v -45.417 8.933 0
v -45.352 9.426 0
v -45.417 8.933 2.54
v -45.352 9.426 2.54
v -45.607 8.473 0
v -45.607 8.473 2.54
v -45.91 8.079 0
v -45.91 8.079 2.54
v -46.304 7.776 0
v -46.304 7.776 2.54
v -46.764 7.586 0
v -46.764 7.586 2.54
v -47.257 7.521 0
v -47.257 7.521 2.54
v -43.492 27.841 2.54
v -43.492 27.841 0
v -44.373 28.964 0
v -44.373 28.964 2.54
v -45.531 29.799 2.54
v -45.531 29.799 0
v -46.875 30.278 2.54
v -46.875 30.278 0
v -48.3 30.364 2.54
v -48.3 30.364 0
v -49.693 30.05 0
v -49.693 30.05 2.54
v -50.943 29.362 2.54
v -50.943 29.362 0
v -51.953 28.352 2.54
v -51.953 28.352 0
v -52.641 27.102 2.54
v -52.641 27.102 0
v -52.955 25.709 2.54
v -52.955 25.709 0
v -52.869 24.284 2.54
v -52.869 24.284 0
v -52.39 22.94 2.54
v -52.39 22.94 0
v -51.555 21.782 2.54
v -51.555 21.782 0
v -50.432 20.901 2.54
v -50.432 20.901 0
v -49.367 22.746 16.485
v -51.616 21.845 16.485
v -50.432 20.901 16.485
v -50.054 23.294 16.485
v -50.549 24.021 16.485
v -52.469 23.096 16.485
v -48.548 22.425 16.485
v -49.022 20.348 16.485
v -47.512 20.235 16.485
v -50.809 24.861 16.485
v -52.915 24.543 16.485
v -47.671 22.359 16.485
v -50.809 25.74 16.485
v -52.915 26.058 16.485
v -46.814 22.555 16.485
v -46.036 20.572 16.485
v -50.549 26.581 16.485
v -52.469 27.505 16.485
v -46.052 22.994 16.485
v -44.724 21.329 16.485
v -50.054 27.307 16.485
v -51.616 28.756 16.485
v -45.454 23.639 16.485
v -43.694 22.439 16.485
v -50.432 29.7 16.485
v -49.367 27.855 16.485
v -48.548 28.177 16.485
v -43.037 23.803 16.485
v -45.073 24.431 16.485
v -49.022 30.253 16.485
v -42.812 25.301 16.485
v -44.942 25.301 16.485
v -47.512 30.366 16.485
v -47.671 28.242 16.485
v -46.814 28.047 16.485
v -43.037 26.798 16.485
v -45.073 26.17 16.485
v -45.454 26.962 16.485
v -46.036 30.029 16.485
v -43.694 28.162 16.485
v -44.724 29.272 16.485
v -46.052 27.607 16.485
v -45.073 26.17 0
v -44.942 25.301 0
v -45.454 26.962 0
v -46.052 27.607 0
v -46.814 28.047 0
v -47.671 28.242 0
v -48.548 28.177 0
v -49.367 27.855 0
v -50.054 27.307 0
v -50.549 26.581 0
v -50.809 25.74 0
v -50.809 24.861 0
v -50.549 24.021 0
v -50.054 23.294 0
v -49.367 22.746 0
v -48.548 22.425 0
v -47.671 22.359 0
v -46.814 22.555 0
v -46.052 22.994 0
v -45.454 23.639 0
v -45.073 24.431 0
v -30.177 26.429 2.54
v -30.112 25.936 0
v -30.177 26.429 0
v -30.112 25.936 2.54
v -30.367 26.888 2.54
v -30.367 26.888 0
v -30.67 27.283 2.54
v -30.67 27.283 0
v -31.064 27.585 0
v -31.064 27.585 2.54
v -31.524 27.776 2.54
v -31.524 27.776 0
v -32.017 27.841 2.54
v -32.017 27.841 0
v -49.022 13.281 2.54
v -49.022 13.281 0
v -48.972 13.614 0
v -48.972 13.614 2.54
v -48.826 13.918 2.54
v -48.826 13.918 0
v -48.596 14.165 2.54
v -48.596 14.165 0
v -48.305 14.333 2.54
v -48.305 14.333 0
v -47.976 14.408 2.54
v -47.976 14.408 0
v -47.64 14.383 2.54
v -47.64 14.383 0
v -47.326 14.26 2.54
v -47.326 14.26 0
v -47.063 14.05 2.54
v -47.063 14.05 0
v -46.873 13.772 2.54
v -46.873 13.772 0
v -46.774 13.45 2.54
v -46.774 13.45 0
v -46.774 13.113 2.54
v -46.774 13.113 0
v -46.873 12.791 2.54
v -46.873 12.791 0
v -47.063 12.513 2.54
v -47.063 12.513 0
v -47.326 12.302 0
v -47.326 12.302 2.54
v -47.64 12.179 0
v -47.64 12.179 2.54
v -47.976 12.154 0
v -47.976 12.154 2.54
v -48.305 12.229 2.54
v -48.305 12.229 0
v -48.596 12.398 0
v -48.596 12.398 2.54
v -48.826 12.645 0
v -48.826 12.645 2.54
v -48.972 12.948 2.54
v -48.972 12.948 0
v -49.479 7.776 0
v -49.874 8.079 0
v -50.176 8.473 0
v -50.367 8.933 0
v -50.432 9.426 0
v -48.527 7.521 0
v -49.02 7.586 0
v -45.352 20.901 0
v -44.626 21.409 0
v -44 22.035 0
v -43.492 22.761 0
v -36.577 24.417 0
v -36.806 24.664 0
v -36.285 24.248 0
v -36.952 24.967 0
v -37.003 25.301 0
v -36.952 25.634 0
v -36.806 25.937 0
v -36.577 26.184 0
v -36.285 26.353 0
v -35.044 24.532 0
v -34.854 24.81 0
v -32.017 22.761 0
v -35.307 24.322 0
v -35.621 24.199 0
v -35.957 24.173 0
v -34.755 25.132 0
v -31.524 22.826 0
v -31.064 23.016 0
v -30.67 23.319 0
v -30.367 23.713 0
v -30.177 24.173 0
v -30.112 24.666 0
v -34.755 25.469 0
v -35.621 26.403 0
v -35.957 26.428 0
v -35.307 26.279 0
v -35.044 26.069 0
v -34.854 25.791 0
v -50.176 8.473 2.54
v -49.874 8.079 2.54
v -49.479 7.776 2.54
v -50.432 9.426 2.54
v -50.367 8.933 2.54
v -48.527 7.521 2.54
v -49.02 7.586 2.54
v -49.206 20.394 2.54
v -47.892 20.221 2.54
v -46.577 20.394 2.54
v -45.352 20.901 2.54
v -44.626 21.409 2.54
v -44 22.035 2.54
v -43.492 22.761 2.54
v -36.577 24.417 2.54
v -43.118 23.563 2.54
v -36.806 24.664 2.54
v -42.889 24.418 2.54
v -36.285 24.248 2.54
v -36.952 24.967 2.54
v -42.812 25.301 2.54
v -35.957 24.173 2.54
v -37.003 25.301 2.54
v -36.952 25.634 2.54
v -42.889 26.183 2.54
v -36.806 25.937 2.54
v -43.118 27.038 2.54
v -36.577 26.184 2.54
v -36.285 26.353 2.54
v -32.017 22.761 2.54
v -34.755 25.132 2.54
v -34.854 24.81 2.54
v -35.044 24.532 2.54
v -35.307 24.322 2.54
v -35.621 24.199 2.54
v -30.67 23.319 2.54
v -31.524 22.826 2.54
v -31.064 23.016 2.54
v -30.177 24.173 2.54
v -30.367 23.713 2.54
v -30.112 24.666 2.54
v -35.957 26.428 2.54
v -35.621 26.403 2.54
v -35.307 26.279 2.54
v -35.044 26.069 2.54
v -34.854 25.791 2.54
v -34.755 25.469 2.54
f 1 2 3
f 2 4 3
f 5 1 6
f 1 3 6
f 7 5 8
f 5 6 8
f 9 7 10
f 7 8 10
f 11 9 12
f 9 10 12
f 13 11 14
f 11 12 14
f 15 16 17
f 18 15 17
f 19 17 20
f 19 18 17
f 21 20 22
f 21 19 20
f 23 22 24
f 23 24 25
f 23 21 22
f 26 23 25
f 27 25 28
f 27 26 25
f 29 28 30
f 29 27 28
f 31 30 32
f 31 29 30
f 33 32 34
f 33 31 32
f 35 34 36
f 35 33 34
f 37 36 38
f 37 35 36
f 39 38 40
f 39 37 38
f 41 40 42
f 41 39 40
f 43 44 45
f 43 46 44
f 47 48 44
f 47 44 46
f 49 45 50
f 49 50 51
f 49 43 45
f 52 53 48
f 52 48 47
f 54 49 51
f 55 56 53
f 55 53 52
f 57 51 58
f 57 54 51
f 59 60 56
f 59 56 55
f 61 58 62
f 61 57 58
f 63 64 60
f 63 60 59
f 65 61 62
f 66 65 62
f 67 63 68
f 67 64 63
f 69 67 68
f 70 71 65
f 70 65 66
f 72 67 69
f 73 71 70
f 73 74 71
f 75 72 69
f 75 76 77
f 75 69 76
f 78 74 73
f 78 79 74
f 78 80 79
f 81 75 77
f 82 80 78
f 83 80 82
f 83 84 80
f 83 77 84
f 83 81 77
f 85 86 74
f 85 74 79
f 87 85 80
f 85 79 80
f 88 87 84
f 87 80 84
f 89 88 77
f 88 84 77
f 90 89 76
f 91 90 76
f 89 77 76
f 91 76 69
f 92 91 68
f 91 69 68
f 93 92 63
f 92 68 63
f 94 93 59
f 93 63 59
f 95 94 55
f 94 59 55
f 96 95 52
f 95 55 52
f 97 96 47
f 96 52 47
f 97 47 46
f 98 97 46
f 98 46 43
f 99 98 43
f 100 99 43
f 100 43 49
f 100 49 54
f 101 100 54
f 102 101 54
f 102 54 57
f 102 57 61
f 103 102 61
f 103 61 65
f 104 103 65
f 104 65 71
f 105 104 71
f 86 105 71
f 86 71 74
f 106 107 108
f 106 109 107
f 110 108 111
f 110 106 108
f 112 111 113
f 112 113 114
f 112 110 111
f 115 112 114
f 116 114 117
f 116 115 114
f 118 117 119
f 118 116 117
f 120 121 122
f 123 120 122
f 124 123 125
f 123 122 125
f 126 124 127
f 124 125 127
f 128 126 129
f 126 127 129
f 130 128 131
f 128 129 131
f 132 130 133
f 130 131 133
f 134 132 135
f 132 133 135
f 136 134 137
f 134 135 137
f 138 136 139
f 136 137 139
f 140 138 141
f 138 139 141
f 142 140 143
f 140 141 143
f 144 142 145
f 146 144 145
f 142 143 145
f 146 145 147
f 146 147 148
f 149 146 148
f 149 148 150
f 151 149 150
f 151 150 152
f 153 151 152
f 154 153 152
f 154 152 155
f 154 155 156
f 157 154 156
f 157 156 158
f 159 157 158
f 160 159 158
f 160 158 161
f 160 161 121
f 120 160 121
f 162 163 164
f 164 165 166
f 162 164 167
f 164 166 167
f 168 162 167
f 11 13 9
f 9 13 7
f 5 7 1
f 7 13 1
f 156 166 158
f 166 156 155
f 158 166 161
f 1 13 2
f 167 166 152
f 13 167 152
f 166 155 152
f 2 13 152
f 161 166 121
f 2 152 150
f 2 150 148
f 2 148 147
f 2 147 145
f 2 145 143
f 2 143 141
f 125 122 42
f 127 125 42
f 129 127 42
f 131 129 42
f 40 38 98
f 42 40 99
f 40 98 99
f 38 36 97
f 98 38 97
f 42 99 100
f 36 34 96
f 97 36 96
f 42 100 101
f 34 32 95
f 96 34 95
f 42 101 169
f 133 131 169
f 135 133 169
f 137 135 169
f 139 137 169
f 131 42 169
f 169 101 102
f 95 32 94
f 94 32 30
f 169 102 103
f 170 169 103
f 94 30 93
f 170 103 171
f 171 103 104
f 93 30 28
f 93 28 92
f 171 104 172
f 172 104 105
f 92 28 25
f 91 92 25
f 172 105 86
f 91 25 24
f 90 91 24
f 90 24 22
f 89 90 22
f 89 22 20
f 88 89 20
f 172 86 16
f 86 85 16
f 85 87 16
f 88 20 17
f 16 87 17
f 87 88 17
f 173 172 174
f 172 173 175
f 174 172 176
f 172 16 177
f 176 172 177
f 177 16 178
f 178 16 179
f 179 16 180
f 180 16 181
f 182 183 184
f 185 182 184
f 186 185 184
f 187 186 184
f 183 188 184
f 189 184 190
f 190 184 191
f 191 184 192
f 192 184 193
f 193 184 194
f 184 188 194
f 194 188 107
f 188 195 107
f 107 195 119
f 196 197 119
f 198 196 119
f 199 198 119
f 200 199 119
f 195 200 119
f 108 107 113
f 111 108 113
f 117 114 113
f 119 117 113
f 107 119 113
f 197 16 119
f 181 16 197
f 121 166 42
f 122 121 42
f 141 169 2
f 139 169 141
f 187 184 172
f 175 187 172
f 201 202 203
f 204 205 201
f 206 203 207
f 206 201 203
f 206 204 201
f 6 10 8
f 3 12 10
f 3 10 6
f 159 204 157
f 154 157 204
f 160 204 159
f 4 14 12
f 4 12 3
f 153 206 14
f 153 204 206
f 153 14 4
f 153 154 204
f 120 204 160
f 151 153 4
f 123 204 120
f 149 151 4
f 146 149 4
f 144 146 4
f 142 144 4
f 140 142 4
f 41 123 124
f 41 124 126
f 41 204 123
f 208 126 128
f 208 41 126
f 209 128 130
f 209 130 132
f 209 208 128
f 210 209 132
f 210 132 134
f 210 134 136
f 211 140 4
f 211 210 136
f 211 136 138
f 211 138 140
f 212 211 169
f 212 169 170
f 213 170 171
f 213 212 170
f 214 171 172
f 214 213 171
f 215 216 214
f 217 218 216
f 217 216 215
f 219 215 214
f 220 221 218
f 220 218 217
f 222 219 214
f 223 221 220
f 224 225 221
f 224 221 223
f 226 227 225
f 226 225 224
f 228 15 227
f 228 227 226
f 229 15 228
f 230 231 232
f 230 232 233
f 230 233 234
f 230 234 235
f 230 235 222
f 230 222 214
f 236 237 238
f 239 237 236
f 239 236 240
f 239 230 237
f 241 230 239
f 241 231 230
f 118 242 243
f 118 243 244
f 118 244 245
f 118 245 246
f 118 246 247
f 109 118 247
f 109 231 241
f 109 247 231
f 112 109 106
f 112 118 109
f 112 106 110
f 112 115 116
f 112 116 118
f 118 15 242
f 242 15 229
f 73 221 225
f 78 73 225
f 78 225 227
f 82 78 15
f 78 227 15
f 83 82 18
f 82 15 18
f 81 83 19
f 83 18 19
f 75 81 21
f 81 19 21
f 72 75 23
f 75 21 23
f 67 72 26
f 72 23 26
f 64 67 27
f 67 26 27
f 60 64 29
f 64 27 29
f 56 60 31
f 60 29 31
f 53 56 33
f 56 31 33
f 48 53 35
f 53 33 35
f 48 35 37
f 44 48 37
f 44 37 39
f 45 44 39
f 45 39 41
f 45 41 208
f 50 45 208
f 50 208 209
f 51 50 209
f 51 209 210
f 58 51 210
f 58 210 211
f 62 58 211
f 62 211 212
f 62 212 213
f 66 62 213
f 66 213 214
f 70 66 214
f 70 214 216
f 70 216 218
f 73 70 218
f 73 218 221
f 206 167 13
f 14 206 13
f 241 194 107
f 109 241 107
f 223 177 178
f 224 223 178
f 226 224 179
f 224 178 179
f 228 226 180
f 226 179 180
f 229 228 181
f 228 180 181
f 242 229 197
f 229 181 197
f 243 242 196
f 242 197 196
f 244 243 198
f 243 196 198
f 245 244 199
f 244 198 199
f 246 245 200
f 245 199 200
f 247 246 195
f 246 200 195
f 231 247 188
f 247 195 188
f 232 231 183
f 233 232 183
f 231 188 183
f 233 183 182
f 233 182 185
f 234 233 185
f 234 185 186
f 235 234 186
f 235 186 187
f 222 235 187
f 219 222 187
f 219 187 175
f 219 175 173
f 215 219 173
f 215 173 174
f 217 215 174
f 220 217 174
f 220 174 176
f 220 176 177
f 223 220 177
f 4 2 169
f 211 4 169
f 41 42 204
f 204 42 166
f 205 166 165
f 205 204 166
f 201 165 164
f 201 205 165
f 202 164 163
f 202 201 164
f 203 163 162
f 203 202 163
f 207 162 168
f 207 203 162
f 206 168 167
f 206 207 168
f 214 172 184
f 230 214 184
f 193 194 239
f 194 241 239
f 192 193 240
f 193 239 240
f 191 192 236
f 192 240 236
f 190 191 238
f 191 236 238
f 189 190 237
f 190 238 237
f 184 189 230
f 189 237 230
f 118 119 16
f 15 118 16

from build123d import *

# Parameters (mm, degrees)
EXTRUDE2_DEPTH                  = 2.54
SKETCH5_R                       = 5.08
EXTRUDE3_DEPTH                  = 13.9446
EXTRUDE3_DEPTH_BACK             = 2.54
F_43_0_089_DIAMETER_HOLE1_D     = 2.2606
F_43_0_089_DIAMETER_HOLE1_DEPTH = 5.08
F_43_0_089_DIAMETER_HOLE1_TIP   = 0.679152758
SKETCH11_R                      = 2.95
EXTRUDE11_DEPTH                 = 17.4846
FILLET1_R                       = 1.905


with BuildPart() as part:
    # Sketch4 → Extrude2 (new body)
    with BuildSketch(Plane.XY):
        Polygon((-30.111603353, 27.840609557), (-51.701603353, 27.840609557), (-51.701603353, 22.760609557), (-50.431603353, 22.760609557), (-50.431603353, 7.520609557), (-45.351603353, 7.520609557), (-45.351603353, 22.760609557), (-30.111603353, 22.760609557), align=None)
    extrude(amount=EXTRUDE2_DEPTH)

    # Sketch5 → Extrude3 (add, two sides)
    with BuildSketch(Plane.XY.offset(2.54)) as extrude3_sk:
        with Locations((-47.891603353, 25.300609557)):
            Circle(SKETCH5_R)
    extrude(amount=EXTRUDE3_DEPTH)
    extrude(extrude3_sk.sketch, amount=-EXTRUDE3_DEPTH_BACK)

    # #43 (0.089) Diameter Hole1
    with Locations(Plane(origin=(-47.891603353, 13.281329557, 2.54), x_dir=(1, 0, 0), z_dir=(0, 0, 1))):
        with Locations((0, 0), (12.01928, 12.01928)):
            Hole(F_43_0_089_DIAMETER_HOLE1_D / 2, depth=F_43_0_089_DIAMETER_HOLE1_DEPTH)
            with Locations((0, 0, -(F_43_0_089_DIAMETER_HOLE1_DEPTH + F_43_0_089_DIAMETER_HOLE1_TIP / 2))):  # 118° drill point
                Cone(0, F_43_0_089_DIAMETER_HOLE1_D / 2, F_43_0_089_DIAMETER_HOLE1_TIP, mode=Mode.SUBTRACT)

    # Sketch11 → Extrude11 (cut, through all)
    with BuildSketch(Plane.XY.offset(16.4846)):
        with Locations((-47.891603353, 25.300609557)):
            Circle(SKETCH11_R)
    extrude(amount=-EXTRUDE11_DEPTH, mode=Mode.SUBTRACT)

    # Fillet1
    fillet1_edges = [part.edges().sort_by_distance(p)[0] for p in [
        (-30.111603353, 22.760609557, 1.27),
        (-45.351603353, 7.520609557, 1.27),
        (-50.431603353, 7.520609557, 1.27),
        (-30.111603353, 27.840609557, 1.27),
    ]]
    fillet(fillet1_edges, radius=FILLET1_R)


solid = part.part
